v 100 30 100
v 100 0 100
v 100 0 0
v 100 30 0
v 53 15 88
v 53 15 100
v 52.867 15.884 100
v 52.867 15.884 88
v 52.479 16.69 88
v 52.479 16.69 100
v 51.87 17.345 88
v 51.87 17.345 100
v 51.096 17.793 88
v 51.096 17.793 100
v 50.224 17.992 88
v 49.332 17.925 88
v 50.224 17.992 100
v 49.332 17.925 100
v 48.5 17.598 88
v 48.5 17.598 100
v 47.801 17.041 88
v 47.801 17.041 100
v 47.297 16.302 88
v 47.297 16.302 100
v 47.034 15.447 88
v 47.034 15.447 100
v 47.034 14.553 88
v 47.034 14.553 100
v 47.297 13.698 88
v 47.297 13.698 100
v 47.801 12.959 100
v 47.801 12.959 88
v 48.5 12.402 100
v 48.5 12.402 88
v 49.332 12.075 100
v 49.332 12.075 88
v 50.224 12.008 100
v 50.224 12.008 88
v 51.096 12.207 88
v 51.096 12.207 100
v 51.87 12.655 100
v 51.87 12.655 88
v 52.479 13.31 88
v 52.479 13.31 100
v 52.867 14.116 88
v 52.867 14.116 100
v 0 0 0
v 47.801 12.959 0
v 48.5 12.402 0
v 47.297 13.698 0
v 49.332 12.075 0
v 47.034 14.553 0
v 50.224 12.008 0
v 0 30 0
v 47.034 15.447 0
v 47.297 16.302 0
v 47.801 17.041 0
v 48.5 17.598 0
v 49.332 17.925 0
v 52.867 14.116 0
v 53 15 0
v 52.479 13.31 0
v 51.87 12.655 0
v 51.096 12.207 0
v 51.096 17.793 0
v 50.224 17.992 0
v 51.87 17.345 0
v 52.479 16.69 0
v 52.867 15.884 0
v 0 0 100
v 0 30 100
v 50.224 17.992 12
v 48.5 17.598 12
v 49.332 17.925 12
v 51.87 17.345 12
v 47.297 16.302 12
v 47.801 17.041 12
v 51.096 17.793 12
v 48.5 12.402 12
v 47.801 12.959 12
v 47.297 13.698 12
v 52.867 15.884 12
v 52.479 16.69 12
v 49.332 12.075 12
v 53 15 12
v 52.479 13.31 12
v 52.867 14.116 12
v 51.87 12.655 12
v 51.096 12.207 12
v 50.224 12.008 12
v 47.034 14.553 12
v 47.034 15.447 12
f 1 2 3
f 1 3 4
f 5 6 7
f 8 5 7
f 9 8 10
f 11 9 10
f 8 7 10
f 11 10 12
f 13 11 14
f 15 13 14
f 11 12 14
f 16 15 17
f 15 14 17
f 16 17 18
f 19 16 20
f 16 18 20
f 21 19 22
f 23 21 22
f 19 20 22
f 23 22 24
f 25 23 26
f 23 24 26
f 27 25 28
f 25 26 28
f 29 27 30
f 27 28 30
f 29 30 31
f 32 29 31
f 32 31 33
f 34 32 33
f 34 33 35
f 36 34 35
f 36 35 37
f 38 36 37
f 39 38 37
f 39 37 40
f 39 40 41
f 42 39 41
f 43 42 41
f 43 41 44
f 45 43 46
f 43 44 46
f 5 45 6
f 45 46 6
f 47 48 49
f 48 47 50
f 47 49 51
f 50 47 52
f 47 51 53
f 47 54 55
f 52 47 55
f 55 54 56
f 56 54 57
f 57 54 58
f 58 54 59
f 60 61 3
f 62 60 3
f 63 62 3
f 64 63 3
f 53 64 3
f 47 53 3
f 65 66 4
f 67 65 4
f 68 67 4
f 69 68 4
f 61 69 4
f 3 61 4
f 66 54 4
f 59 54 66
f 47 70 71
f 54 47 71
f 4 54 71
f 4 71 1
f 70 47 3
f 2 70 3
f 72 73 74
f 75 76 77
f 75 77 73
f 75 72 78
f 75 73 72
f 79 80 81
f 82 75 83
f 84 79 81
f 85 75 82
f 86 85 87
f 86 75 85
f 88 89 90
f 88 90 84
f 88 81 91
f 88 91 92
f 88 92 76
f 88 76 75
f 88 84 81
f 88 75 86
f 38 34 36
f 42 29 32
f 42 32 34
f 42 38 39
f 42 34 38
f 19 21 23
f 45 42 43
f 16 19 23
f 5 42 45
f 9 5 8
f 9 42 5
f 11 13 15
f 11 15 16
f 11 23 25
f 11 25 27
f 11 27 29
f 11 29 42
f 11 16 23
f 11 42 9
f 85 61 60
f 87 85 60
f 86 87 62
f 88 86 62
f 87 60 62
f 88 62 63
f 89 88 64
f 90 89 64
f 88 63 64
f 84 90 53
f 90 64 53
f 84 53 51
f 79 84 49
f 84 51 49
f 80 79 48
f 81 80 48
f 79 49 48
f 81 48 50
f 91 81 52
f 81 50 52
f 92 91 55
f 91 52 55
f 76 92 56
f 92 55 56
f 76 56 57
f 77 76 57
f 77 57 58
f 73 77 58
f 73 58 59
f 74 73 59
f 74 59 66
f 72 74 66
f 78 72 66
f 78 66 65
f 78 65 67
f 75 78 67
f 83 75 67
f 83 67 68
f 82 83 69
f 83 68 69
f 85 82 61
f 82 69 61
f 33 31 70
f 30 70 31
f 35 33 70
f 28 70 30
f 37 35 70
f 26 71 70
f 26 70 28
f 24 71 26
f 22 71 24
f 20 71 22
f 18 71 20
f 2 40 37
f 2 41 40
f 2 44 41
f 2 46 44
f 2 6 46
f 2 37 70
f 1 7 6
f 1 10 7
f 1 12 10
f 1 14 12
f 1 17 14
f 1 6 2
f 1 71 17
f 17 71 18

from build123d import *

# Parameters (mm, degrees)
F0_W     = 100
F0_H     = 30
F1_DEPTH = 100
F2_R     = 3
F3_DEPTH = 12
F4_R     = 3
F5_DEPTH = 12


with BuildPart() as f1:
    # F0 (on Top) → F1 (new body)
    with BuildSketch(Plane.XY):
        with Locations((50, 15)):
            Rectangle(F0_W, F0_H)
    extrude(amount=F1_DEPTH)

    # F2 (on face) → F3 (cut)
    with BuildSketch(Plane(origin=(0, 0, 0), x_dir=(1, 0, 0), z_dir=(0, 0, -1))):
        with Locations((50, -15)):
            Circle(F2_R)
    extrude(amount=-F3_DEPTH, mode=Mode.SUBTRACT)

    # F4 (on face) → F5 (cut)
    with BuildSketch(Plane.XY.offset(100)):
        with Locations((50, 15)):
            Circle(F4_R)
    extrude(amount=-F5_DEPTH, mode=Mode.SUBTRACT)


solid = f1.part
